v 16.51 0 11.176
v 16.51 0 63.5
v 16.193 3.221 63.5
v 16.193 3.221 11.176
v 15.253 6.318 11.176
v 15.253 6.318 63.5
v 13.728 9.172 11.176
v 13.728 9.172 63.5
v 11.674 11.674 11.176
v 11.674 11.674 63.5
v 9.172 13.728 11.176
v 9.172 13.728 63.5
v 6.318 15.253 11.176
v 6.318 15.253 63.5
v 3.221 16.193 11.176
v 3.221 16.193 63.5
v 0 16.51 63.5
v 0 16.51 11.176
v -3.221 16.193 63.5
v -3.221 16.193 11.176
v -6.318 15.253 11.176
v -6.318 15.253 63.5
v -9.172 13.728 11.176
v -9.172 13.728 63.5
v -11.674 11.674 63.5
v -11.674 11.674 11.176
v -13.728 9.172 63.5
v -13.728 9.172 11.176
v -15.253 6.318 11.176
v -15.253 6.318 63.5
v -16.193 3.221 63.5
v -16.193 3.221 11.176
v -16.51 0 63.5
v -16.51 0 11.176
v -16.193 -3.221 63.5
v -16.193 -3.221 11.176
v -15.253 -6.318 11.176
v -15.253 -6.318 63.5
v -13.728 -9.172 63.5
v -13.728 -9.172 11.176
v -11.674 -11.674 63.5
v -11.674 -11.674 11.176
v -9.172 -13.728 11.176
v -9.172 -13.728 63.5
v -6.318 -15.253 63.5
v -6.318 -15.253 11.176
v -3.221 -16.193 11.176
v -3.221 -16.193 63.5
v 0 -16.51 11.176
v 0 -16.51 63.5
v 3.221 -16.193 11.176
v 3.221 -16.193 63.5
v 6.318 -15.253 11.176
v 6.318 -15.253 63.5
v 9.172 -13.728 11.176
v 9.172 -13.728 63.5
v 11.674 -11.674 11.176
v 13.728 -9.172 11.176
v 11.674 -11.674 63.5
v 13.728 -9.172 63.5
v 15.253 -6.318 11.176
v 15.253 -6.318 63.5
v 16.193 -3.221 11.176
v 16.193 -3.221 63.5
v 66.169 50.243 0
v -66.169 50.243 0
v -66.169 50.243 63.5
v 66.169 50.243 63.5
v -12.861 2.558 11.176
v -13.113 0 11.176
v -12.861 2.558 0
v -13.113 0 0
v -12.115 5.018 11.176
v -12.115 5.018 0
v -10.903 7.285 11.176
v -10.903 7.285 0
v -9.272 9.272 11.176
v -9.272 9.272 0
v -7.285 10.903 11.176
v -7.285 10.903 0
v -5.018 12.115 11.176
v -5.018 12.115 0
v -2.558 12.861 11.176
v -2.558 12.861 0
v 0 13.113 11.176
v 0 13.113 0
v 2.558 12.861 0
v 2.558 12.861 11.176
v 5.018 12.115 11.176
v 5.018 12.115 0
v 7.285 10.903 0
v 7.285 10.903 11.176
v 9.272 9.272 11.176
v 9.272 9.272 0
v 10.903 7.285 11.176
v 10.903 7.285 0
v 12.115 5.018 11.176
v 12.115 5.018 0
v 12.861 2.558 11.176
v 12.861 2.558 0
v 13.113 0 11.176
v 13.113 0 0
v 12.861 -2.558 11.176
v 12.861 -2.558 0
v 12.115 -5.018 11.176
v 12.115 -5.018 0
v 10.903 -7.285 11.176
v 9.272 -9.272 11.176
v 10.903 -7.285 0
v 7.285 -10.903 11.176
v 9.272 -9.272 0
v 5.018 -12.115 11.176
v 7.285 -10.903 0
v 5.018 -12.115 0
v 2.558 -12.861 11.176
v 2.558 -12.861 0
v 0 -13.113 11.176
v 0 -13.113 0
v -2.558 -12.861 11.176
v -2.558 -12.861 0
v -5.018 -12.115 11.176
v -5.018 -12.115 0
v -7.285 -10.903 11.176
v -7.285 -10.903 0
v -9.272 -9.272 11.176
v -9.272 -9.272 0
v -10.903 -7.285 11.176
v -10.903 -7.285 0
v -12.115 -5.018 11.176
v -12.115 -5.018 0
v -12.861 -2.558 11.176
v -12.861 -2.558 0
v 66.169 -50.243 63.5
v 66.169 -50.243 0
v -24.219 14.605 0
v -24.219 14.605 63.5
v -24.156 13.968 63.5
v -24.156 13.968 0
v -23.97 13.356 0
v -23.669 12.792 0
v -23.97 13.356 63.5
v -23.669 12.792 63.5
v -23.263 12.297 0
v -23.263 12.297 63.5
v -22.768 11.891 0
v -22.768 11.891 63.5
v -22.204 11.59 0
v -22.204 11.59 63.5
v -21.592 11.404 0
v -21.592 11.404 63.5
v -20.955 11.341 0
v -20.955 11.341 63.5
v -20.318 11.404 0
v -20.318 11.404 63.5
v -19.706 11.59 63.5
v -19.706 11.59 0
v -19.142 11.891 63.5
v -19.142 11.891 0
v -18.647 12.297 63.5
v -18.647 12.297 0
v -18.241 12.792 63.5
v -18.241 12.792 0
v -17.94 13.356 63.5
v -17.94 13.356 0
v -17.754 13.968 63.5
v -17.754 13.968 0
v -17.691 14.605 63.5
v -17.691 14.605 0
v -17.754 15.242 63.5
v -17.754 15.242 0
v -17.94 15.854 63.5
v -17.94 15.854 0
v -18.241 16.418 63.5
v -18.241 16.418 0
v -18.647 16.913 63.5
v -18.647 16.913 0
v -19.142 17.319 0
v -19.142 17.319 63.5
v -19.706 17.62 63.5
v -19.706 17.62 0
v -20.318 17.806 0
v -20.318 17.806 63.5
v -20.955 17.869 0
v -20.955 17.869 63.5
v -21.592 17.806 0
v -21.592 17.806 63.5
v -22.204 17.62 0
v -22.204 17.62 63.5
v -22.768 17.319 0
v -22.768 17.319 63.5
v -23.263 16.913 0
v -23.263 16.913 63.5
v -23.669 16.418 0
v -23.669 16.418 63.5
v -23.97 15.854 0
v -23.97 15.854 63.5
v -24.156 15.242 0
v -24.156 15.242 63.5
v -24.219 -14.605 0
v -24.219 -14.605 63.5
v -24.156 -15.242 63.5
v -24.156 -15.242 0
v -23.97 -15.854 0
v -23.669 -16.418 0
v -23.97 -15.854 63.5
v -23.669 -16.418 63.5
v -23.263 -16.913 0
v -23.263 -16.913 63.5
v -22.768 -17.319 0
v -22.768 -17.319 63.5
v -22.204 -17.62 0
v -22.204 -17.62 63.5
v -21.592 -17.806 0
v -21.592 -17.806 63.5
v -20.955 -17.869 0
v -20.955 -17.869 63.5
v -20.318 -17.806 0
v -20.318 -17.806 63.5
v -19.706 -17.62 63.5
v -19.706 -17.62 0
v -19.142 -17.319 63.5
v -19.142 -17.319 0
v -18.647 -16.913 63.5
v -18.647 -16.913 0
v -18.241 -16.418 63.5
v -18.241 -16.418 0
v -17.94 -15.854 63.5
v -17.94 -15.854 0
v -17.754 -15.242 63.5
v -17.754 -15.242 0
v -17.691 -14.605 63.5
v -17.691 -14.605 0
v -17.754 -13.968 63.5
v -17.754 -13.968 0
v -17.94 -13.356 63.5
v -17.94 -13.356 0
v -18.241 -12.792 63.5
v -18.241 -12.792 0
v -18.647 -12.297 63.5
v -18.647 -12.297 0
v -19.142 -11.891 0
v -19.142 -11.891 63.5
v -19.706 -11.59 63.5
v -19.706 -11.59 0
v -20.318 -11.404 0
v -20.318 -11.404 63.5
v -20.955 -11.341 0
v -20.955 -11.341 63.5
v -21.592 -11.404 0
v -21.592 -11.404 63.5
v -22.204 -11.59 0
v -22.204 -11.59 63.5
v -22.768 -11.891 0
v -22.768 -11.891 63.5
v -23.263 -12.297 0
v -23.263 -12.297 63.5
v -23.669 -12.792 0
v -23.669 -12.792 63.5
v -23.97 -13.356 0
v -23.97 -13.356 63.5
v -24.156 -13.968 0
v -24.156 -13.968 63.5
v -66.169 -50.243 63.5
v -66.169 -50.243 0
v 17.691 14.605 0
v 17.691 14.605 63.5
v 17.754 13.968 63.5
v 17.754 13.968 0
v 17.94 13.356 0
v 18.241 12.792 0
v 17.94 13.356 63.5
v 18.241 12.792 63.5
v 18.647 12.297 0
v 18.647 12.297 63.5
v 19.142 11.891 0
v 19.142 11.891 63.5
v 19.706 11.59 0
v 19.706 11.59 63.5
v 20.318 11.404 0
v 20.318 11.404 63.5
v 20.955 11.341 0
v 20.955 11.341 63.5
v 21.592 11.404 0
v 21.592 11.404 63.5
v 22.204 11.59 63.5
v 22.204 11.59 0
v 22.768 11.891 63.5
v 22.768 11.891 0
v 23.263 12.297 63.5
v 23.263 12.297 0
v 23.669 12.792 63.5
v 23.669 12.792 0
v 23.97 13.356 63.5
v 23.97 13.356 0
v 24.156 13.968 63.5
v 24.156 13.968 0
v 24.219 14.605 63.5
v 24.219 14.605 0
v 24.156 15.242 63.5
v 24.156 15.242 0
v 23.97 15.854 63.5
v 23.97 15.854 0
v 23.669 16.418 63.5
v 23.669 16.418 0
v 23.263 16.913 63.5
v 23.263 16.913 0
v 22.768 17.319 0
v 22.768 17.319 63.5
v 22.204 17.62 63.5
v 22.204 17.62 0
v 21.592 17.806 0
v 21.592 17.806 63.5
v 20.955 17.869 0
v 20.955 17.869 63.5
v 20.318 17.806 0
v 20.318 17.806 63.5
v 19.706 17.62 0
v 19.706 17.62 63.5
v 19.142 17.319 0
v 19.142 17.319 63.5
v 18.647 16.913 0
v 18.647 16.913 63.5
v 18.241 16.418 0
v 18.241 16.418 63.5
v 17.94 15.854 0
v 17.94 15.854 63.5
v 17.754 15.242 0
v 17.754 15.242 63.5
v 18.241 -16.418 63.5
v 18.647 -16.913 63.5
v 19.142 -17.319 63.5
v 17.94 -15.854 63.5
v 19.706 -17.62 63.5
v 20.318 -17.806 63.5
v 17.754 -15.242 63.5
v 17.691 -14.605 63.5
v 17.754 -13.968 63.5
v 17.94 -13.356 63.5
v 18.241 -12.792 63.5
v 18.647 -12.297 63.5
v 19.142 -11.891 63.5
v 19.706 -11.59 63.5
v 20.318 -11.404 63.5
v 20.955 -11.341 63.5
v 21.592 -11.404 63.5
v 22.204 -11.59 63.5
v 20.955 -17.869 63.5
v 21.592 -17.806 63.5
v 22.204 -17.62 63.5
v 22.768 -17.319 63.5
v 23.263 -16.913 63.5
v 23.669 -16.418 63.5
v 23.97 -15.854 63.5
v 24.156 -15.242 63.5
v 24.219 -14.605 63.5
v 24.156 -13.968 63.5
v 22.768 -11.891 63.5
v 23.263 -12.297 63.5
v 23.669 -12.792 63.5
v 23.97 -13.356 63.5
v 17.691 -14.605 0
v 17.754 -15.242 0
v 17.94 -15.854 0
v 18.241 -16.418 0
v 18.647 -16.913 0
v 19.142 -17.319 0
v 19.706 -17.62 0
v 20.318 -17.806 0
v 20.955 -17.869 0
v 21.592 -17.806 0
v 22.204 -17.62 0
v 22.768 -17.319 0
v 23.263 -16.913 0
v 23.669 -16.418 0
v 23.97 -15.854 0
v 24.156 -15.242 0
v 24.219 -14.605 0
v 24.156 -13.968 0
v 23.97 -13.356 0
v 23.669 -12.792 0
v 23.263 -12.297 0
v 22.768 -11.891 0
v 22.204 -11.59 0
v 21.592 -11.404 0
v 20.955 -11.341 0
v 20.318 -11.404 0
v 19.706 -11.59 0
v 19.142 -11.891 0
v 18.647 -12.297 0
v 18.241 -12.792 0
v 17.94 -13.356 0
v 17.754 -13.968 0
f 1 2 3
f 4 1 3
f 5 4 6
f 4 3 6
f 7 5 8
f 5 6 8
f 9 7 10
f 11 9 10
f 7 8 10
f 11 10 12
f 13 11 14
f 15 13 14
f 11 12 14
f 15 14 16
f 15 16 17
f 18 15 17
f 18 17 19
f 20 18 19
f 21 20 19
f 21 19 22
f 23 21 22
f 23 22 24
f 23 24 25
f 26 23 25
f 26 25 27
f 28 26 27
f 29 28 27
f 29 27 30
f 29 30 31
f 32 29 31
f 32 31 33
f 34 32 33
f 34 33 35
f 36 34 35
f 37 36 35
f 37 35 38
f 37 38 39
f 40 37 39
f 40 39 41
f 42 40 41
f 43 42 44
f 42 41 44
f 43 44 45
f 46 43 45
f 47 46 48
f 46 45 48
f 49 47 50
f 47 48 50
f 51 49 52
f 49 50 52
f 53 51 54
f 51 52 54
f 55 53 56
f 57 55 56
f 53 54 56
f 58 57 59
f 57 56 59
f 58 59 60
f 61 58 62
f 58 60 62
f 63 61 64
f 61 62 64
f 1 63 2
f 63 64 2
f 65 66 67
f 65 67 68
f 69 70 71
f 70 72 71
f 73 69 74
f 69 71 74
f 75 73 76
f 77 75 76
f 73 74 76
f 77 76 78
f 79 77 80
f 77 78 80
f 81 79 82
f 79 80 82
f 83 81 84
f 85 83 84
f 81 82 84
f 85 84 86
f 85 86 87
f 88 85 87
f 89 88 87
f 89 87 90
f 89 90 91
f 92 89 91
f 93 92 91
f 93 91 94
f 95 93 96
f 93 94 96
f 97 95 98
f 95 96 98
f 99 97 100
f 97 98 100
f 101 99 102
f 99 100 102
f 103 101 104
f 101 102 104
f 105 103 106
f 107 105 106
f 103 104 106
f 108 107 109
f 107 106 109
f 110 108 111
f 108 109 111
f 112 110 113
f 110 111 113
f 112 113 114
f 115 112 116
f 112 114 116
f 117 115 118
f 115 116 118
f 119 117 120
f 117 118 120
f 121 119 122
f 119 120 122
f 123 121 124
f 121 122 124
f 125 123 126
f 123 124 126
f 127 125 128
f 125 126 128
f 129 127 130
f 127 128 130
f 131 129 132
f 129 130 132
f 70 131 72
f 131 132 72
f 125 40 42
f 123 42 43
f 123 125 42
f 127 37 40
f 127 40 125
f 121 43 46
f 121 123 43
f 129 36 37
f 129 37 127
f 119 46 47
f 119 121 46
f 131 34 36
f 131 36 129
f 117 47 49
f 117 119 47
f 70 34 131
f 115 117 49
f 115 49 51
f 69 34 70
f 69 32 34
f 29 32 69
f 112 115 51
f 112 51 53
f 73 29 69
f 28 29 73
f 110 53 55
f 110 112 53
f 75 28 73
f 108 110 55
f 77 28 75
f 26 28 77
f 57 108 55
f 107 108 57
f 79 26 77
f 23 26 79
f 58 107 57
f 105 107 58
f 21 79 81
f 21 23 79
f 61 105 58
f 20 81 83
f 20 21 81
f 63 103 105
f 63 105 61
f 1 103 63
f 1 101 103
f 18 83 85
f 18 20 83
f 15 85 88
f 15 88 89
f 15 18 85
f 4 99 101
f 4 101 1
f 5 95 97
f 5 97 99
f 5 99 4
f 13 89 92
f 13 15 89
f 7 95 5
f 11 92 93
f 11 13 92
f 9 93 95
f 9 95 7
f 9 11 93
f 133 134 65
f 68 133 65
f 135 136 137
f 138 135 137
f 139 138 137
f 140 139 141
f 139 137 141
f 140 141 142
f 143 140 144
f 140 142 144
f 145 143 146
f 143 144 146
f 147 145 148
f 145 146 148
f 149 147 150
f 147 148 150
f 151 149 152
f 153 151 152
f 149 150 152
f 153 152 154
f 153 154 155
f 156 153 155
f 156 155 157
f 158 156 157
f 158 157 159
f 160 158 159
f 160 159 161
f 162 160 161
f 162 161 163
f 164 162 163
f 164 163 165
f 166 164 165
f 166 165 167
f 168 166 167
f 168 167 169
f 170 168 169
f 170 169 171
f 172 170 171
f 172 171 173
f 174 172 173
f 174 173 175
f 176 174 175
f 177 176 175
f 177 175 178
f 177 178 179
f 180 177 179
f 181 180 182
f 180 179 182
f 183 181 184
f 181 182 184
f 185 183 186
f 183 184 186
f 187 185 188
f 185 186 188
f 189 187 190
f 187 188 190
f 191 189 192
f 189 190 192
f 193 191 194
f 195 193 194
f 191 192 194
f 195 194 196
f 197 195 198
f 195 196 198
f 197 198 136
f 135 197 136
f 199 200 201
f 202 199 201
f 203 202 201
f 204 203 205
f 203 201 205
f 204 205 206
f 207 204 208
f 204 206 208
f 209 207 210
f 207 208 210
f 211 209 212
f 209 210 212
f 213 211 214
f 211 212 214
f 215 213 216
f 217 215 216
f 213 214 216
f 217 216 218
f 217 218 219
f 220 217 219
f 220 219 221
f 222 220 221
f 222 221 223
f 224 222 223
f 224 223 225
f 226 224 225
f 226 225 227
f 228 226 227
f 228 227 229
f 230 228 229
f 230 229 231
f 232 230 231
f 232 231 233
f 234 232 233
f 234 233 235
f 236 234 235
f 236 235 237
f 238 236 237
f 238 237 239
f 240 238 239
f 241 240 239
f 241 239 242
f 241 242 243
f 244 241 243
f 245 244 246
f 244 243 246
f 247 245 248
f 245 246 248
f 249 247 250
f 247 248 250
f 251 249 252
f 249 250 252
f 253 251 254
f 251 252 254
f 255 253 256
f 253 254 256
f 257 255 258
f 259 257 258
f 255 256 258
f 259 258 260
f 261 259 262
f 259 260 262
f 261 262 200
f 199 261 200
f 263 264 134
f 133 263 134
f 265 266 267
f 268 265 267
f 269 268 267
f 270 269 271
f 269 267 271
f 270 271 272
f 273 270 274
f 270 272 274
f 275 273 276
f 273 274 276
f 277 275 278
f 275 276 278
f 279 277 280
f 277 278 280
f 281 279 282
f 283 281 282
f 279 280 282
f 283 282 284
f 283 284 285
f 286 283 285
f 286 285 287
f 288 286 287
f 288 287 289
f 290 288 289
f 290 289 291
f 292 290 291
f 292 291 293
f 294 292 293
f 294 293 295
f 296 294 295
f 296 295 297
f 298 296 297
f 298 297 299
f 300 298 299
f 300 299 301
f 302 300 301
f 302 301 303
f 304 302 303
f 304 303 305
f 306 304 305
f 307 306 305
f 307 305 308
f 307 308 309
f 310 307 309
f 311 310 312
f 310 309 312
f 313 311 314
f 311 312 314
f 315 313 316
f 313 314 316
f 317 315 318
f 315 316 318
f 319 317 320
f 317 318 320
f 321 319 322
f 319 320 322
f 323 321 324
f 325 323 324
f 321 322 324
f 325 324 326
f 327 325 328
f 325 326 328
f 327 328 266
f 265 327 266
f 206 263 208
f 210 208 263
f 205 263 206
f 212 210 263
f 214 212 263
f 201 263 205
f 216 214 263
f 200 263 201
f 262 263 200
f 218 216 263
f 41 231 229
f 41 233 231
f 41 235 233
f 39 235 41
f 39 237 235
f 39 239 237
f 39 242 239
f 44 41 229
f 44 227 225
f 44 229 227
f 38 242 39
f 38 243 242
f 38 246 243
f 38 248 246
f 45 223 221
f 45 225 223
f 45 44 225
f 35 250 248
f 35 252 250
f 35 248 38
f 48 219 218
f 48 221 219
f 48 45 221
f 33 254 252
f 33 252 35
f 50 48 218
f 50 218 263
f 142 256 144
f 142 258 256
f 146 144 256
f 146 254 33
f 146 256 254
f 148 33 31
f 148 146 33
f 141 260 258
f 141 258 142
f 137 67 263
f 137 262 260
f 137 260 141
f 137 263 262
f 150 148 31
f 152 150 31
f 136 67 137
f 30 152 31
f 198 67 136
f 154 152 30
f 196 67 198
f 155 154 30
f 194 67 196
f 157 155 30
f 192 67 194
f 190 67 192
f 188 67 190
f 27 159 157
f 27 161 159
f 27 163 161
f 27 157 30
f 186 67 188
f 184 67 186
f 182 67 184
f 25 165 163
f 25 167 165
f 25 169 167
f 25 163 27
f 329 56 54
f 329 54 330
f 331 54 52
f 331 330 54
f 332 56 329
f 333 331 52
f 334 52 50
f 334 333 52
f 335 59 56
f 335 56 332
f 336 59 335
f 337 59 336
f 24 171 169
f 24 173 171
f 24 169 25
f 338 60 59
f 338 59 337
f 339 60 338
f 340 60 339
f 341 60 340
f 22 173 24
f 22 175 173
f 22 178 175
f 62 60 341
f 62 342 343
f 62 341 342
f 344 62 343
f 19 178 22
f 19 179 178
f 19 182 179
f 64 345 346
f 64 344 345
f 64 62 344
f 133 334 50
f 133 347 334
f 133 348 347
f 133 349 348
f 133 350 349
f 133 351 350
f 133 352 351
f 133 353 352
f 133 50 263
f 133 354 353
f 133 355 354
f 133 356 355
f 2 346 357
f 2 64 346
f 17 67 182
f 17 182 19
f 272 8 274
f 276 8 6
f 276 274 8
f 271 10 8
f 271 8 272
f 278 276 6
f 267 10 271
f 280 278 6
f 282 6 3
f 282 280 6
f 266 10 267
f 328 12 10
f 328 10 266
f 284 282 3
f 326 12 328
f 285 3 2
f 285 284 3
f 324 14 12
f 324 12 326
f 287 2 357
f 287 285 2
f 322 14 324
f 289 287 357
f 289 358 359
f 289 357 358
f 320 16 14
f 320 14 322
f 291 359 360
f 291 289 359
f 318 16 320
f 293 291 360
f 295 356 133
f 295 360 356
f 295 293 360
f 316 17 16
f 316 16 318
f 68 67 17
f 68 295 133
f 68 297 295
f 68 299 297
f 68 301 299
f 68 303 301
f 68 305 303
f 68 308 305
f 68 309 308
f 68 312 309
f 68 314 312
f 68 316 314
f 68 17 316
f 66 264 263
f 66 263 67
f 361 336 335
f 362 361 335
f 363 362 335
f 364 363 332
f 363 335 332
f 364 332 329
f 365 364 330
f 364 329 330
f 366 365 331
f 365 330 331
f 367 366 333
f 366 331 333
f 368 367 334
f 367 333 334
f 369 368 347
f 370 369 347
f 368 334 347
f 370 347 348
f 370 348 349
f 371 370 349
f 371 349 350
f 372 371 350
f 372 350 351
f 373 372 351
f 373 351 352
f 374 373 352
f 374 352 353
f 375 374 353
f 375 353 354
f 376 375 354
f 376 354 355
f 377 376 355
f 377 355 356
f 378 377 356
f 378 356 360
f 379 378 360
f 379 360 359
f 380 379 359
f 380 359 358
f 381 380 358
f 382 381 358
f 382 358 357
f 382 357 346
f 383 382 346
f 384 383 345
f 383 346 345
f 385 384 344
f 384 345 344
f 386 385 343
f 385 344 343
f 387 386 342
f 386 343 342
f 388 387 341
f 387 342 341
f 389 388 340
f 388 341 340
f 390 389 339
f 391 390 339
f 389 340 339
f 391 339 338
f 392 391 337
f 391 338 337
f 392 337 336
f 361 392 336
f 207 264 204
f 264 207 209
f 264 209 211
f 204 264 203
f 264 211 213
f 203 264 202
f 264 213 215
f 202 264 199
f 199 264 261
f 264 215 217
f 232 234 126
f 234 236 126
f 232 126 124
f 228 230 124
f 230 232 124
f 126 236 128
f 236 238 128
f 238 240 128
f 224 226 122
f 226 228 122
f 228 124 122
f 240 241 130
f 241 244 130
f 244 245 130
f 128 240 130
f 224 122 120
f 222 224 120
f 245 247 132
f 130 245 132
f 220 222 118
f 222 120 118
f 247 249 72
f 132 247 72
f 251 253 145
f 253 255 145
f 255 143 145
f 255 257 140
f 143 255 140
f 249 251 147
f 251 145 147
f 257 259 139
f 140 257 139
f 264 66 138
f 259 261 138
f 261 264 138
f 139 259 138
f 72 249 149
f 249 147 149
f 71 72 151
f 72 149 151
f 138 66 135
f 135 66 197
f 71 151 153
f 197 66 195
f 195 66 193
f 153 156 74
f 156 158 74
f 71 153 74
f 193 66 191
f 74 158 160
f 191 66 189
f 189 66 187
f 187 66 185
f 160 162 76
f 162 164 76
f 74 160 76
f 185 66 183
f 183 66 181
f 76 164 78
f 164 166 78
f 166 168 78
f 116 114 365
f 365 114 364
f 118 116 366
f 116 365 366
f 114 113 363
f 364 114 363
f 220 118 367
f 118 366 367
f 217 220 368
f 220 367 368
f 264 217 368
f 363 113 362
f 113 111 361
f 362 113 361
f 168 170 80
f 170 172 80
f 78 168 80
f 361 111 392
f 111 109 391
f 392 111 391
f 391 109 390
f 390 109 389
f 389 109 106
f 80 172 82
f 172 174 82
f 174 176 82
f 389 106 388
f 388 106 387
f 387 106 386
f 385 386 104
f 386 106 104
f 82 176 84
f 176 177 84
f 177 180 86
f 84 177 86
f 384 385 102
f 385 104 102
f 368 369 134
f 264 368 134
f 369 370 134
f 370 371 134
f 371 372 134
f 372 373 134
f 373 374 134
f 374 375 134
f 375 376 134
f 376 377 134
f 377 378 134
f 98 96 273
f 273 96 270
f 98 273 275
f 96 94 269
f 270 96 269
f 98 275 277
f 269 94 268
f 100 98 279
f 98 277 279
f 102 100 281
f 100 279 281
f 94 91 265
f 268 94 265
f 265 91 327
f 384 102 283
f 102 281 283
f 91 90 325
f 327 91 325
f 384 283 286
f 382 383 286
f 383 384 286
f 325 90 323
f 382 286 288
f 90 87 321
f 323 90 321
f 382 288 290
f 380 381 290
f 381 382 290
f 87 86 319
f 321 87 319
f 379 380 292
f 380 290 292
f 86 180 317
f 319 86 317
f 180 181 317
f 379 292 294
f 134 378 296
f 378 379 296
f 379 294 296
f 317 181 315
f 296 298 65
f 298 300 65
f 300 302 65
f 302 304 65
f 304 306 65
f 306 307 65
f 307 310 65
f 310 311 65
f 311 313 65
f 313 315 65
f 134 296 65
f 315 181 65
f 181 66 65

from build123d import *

# Parameters (mm, degrees)
F0_W           = 132.338822
F0_H           = 100.486502
F1_DEPTH       = 63.5
F3_D           = 26.2255
F3_CBORE_D     = 33.02
F3_CBORE_DEPTH = 52.324
F5_D           = 6.5278


with BuildPart() as f1:
    # F0 (on Top) → F1 (new body)
    with BuildSketch(Plane.XY):
        Rectangle(F0_W, F0_H)
    extrude(amount=F1_DEPTH)

    # F3 (through all)
    with Locations(Plane.XY.offset(63.5)):
        with Locations((0, 0)):
            CounterBoreHole(F3_D / 2, F3_CBORE_D / 2, F3_CBORE_DEPTH)

    # F5 (through all)
    with Locations(Plane(origin=(0, 0, 0), x_dir=(1, 0, 0), z_dir=(0, 0, -1))):
        with Locations((-20.955, 14.605), (-20.955, -14.605), (20.955, -14.605), (20.955, 14.605)):
            Hole(F5_D / 2)


solid = f1.part
